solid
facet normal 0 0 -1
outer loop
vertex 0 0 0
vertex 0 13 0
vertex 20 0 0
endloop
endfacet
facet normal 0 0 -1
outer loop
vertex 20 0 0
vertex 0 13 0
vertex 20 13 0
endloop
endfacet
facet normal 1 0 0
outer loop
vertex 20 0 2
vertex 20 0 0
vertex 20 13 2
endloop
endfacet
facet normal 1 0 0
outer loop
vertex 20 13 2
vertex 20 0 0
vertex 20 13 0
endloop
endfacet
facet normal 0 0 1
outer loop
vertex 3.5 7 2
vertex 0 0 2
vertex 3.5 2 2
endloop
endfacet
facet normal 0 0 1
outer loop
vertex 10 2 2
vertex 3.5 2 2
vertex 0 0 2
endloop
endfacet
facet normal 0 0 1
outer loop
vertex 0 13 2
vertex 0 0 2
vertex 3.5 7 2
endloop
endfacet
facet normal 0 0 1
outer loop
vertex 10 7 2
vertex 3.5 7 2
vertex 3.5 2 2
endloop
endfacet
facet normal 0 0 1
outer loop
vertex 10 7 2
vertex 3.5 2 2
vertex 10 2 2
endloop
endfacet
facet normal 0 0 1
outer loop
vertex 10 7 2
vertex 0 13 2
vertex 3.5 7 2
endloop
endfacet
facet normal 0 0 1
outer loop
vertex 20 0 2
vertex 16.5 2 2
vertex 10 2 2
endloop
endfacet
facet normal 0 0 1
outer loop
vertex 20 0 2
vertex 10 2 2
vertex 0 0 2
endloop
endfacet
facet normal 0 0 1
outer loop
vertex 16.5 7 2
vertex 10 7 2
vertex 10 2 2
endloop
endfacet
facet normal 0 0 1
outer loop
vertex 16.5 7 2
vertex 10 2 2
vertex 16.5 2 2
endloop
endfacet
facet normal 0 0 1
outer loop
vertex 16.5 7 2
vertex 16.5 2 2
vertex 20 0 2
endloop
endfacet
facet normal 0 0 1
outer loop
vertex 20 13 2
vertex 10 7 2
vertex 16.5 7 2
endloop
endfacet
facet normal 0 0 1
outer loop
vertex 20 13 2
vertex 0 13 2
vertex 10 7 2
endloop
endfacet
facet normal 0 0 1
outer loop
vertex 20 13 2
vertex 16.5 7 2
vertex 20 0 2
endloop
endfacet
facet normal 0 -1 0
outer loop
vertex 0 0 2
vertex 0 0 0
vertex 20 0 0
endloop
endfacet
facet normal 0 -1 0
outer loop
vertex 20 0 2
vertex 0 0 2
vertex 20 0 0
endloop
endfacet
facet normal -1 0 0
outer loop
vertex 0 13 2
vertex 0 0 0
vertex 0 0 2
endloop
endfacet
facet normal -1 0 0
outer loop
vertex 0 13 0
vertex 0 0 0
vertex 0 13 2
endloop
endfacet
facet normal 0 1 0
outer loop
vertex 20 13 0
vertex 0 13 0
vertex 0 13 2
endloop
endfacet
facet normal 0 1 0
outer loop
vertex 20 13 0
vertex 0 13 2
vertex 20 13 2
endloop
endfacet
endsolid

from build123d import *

# Parameters (mm, degrees)
SKETCH1_W           = 20
SKETCH1_H           = 13
BOSS_EXTRUDE1_DEPTH = 9
SKETCH2_W           = 16
SKETCH2_H           = 9
CUT_EXTRUDE1_DEPTH  = 7
SKETCH3_R           = 1.5
CUT_EXTRUDE2_DEPTH  = 7
SKETCH5_W           = 20
SKETCH5_H           = 13
CUT_EXTRUDE4_DEPTH  = 7


with BuildPart() as part:
    # Sketch1 → Boss-Extrude1 (new body)
    with BuildSketch(Plane.XY):
        with Locations((10, 6.5)):
            Rectangle(SKETCH1_W, SKETCH1_H)
    extrude(amount=BOSS_EXTRUDE1_DEPTH)

    # Sketch2 → Cut-Extrude1 (cut)
    with BuildSketch(Plane.XY.offset(9)):
        with Locations((10, 6.5)):
            Rectangle(SKETCH2_W, SKETCH2_H)
    extrude(amount=-CUT_EXTRUDE1_DEPTH, mode=Mode.SUBTRACT)

    # Sketch3 → Cut-Extrude2 (cut)
    with BuildSketch(Plane.XZ):
        with Locations(Location((3.5, 3.5, 0), (0, 0, 270))):
            Circle(SKETCH3_R)
        with Locations(Location((10, 3.5, 0), (0, 0, 270))):
            Circle(SKETCH3_R)
        with Locations(Location((16.5, 3.5, 0), (0, 0, 270))):
            Circle(SKETCH3_R)
    extrude(amount=-CUT_EXTRUDE2_DEPTH, mode=Mode.SUBTRACT)

    # Sketch5 → Cut-Extrude4 (cut)
    with BuildSketch(Plane.XY.offset(9)):
        with Locations((10, 6.5)):
            Rectangle(SKETCH5_W, SKETCH5_H)
    extrude(amount=-CUT_EXTRUDE4_DEPTH, mode=Mode.SUBTRACT)


solid = part.part
